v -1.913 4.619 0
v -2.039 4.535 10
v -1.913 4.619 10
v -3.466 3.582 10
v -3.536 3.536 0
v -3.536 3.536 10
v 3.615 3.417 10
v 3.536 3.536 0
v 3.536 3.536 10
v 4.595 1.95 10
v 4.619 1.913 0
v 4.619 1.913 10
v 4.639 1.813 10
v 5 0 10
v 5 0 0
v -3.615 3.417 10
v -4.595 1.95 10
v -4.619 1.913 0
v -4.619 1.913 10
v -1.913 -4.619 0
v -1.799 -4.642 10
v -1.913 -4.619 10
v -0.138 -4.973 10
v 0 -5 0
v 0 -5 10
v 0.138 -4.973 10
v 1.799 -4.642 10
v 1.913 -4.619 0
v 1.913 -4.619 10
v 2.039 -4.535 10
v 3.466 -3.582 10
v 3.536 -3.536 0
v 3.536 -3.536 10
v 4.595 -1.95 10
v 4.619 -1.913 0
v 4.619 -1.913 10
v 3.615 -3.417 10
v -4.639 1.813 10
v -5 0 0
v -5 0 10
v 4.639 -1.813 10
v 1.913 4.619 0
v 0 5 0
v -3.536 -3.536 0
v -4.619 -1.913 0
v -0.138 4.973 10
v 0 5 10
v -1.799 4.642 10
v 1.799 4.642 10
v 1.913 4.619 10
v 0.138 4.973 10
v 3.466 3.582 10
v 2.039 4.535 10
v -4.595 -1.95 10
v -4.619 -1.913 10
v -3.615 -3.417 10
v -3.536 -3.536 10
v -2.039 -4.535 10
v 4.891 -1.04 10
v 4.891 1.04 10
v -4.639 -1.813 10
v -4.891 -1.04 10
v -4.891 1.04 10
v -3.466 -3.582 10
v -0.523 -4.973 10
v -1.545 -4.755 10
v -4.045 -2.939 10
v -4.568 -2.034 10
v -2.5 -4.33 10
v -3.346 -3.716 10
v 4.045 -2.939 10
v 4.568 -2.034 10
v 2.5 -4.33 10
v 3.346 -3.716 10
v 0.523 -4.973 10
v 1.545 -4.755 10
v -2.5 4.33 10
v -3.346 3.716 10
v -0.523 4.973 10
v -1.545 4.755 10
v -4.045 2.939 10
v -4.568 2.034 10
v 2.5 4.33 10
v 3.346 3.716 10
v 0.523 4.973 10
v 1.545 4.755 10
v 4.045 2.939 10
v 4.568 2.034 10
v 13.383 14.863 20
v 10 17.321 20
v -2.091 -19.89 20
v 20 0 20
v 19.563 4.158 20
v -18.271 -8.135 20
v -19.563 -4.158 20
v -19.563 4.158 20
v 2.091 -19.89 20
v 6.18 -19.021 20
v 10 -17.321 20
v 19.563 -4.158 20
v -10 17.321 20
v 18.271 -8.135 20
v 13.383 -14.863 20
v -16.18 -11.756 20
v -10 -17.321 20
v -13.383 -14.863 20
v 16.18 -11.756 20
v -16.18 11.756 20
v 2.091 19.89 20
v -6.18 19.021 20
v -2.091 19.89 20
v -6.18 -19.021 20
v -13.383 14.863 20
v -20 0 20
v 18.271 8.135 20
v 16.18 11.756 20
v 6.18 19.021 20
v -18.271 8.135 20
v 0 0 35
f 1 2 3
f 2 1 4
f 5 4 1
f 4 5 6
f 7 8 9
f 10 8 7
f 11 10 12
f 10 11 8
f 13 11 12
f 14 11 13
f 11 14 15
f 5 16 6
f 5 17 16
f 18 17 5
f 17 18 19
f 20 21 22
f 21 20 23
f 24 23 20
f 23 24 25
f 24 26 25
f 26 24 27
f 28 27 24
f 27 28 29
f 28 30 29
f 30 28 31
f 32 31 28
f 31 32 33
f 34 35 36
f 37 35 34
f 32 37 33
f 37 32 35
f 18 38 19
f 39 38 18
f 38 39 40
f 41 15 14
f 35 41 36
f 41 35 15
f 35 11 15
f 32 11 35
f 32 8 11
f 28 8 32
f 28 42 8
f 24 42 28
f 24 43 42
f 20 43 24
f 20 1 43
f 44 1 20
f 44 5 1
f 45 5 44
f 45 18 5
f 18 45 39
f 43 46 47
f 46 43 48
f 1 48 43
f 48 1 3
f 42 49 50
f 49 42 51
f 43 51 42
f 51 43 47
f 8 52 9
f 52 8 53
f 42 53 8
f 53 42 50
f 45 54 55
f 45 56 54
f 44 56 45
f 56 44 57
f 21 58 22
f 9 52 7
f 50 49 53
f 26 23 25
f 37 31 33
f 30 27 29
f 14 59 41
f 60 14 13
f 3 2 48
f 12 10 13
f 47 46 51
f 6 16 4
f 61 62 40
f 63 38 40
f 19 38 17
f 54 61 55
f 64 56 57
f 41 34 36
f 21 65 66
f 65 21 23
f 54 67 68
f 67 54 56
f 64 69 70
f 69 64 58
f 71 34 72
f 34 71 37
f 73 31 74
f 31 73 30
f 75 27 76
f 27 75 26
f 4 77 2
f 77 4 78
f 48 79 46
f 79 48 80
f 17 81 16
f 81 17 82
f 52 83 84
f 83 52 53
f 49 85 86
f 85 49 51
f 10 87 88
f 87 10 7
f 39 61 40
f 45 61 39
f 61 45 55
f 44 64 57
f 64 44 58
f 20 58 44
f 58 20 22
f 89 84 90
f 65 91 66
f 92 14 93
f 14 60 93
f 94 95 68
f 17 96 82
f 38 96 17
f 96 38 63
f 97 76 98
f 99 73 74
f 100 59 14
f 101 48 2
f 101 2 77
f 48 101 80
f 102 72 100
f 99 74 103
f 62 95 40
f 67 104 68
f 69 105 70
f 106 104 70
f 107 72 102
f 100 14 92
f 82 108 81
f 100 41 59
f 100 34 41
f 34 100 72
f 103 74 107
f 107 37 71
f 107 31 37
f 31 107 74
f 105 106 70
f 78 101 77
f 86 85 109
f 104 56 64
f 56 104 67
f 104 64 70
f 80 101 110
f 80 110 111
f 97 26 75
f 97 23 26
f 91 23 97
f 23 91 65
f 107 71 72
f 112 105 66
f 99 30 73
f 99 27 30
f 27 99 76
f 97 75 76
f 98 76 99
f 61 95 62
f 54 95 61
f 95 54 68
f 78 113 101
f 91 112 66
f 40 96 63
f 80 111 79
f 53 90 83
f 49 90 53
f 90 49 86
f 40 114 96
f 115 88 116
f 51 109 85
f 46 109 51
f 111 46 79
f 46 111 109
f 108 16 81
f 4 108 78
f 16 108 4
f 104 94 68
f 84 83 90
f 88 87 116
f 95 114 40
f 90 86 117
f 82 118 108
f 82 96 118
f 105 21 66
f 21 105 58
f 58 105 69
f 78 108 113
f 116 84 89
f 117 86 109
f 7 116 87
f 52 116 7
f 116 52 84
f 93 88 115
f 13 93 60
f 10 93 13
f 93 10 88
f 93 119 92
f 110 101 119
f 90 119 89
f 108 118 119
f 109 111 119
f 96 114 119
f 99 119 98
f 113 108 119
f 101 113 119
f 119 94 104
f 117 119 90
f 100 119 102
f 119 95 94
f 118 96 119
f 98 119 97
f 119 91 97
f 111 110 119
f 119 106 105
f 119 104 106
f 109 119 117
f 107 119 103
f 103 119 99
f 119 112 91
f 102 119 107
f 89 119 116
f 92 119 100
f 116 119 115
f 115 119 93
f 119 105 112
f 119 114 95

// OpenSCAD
hs = [10, 10, 15];
cumulative_hs = [0, hs[0], hs[0]+hs[1]];
rs = [5, 5, 20, 0];

for (i = [0:len(hs)]){
    translate([0, 0, cumulative_hs[i]])
    cylinder(hs[i], rs[i], rs[i + 1]);
}
